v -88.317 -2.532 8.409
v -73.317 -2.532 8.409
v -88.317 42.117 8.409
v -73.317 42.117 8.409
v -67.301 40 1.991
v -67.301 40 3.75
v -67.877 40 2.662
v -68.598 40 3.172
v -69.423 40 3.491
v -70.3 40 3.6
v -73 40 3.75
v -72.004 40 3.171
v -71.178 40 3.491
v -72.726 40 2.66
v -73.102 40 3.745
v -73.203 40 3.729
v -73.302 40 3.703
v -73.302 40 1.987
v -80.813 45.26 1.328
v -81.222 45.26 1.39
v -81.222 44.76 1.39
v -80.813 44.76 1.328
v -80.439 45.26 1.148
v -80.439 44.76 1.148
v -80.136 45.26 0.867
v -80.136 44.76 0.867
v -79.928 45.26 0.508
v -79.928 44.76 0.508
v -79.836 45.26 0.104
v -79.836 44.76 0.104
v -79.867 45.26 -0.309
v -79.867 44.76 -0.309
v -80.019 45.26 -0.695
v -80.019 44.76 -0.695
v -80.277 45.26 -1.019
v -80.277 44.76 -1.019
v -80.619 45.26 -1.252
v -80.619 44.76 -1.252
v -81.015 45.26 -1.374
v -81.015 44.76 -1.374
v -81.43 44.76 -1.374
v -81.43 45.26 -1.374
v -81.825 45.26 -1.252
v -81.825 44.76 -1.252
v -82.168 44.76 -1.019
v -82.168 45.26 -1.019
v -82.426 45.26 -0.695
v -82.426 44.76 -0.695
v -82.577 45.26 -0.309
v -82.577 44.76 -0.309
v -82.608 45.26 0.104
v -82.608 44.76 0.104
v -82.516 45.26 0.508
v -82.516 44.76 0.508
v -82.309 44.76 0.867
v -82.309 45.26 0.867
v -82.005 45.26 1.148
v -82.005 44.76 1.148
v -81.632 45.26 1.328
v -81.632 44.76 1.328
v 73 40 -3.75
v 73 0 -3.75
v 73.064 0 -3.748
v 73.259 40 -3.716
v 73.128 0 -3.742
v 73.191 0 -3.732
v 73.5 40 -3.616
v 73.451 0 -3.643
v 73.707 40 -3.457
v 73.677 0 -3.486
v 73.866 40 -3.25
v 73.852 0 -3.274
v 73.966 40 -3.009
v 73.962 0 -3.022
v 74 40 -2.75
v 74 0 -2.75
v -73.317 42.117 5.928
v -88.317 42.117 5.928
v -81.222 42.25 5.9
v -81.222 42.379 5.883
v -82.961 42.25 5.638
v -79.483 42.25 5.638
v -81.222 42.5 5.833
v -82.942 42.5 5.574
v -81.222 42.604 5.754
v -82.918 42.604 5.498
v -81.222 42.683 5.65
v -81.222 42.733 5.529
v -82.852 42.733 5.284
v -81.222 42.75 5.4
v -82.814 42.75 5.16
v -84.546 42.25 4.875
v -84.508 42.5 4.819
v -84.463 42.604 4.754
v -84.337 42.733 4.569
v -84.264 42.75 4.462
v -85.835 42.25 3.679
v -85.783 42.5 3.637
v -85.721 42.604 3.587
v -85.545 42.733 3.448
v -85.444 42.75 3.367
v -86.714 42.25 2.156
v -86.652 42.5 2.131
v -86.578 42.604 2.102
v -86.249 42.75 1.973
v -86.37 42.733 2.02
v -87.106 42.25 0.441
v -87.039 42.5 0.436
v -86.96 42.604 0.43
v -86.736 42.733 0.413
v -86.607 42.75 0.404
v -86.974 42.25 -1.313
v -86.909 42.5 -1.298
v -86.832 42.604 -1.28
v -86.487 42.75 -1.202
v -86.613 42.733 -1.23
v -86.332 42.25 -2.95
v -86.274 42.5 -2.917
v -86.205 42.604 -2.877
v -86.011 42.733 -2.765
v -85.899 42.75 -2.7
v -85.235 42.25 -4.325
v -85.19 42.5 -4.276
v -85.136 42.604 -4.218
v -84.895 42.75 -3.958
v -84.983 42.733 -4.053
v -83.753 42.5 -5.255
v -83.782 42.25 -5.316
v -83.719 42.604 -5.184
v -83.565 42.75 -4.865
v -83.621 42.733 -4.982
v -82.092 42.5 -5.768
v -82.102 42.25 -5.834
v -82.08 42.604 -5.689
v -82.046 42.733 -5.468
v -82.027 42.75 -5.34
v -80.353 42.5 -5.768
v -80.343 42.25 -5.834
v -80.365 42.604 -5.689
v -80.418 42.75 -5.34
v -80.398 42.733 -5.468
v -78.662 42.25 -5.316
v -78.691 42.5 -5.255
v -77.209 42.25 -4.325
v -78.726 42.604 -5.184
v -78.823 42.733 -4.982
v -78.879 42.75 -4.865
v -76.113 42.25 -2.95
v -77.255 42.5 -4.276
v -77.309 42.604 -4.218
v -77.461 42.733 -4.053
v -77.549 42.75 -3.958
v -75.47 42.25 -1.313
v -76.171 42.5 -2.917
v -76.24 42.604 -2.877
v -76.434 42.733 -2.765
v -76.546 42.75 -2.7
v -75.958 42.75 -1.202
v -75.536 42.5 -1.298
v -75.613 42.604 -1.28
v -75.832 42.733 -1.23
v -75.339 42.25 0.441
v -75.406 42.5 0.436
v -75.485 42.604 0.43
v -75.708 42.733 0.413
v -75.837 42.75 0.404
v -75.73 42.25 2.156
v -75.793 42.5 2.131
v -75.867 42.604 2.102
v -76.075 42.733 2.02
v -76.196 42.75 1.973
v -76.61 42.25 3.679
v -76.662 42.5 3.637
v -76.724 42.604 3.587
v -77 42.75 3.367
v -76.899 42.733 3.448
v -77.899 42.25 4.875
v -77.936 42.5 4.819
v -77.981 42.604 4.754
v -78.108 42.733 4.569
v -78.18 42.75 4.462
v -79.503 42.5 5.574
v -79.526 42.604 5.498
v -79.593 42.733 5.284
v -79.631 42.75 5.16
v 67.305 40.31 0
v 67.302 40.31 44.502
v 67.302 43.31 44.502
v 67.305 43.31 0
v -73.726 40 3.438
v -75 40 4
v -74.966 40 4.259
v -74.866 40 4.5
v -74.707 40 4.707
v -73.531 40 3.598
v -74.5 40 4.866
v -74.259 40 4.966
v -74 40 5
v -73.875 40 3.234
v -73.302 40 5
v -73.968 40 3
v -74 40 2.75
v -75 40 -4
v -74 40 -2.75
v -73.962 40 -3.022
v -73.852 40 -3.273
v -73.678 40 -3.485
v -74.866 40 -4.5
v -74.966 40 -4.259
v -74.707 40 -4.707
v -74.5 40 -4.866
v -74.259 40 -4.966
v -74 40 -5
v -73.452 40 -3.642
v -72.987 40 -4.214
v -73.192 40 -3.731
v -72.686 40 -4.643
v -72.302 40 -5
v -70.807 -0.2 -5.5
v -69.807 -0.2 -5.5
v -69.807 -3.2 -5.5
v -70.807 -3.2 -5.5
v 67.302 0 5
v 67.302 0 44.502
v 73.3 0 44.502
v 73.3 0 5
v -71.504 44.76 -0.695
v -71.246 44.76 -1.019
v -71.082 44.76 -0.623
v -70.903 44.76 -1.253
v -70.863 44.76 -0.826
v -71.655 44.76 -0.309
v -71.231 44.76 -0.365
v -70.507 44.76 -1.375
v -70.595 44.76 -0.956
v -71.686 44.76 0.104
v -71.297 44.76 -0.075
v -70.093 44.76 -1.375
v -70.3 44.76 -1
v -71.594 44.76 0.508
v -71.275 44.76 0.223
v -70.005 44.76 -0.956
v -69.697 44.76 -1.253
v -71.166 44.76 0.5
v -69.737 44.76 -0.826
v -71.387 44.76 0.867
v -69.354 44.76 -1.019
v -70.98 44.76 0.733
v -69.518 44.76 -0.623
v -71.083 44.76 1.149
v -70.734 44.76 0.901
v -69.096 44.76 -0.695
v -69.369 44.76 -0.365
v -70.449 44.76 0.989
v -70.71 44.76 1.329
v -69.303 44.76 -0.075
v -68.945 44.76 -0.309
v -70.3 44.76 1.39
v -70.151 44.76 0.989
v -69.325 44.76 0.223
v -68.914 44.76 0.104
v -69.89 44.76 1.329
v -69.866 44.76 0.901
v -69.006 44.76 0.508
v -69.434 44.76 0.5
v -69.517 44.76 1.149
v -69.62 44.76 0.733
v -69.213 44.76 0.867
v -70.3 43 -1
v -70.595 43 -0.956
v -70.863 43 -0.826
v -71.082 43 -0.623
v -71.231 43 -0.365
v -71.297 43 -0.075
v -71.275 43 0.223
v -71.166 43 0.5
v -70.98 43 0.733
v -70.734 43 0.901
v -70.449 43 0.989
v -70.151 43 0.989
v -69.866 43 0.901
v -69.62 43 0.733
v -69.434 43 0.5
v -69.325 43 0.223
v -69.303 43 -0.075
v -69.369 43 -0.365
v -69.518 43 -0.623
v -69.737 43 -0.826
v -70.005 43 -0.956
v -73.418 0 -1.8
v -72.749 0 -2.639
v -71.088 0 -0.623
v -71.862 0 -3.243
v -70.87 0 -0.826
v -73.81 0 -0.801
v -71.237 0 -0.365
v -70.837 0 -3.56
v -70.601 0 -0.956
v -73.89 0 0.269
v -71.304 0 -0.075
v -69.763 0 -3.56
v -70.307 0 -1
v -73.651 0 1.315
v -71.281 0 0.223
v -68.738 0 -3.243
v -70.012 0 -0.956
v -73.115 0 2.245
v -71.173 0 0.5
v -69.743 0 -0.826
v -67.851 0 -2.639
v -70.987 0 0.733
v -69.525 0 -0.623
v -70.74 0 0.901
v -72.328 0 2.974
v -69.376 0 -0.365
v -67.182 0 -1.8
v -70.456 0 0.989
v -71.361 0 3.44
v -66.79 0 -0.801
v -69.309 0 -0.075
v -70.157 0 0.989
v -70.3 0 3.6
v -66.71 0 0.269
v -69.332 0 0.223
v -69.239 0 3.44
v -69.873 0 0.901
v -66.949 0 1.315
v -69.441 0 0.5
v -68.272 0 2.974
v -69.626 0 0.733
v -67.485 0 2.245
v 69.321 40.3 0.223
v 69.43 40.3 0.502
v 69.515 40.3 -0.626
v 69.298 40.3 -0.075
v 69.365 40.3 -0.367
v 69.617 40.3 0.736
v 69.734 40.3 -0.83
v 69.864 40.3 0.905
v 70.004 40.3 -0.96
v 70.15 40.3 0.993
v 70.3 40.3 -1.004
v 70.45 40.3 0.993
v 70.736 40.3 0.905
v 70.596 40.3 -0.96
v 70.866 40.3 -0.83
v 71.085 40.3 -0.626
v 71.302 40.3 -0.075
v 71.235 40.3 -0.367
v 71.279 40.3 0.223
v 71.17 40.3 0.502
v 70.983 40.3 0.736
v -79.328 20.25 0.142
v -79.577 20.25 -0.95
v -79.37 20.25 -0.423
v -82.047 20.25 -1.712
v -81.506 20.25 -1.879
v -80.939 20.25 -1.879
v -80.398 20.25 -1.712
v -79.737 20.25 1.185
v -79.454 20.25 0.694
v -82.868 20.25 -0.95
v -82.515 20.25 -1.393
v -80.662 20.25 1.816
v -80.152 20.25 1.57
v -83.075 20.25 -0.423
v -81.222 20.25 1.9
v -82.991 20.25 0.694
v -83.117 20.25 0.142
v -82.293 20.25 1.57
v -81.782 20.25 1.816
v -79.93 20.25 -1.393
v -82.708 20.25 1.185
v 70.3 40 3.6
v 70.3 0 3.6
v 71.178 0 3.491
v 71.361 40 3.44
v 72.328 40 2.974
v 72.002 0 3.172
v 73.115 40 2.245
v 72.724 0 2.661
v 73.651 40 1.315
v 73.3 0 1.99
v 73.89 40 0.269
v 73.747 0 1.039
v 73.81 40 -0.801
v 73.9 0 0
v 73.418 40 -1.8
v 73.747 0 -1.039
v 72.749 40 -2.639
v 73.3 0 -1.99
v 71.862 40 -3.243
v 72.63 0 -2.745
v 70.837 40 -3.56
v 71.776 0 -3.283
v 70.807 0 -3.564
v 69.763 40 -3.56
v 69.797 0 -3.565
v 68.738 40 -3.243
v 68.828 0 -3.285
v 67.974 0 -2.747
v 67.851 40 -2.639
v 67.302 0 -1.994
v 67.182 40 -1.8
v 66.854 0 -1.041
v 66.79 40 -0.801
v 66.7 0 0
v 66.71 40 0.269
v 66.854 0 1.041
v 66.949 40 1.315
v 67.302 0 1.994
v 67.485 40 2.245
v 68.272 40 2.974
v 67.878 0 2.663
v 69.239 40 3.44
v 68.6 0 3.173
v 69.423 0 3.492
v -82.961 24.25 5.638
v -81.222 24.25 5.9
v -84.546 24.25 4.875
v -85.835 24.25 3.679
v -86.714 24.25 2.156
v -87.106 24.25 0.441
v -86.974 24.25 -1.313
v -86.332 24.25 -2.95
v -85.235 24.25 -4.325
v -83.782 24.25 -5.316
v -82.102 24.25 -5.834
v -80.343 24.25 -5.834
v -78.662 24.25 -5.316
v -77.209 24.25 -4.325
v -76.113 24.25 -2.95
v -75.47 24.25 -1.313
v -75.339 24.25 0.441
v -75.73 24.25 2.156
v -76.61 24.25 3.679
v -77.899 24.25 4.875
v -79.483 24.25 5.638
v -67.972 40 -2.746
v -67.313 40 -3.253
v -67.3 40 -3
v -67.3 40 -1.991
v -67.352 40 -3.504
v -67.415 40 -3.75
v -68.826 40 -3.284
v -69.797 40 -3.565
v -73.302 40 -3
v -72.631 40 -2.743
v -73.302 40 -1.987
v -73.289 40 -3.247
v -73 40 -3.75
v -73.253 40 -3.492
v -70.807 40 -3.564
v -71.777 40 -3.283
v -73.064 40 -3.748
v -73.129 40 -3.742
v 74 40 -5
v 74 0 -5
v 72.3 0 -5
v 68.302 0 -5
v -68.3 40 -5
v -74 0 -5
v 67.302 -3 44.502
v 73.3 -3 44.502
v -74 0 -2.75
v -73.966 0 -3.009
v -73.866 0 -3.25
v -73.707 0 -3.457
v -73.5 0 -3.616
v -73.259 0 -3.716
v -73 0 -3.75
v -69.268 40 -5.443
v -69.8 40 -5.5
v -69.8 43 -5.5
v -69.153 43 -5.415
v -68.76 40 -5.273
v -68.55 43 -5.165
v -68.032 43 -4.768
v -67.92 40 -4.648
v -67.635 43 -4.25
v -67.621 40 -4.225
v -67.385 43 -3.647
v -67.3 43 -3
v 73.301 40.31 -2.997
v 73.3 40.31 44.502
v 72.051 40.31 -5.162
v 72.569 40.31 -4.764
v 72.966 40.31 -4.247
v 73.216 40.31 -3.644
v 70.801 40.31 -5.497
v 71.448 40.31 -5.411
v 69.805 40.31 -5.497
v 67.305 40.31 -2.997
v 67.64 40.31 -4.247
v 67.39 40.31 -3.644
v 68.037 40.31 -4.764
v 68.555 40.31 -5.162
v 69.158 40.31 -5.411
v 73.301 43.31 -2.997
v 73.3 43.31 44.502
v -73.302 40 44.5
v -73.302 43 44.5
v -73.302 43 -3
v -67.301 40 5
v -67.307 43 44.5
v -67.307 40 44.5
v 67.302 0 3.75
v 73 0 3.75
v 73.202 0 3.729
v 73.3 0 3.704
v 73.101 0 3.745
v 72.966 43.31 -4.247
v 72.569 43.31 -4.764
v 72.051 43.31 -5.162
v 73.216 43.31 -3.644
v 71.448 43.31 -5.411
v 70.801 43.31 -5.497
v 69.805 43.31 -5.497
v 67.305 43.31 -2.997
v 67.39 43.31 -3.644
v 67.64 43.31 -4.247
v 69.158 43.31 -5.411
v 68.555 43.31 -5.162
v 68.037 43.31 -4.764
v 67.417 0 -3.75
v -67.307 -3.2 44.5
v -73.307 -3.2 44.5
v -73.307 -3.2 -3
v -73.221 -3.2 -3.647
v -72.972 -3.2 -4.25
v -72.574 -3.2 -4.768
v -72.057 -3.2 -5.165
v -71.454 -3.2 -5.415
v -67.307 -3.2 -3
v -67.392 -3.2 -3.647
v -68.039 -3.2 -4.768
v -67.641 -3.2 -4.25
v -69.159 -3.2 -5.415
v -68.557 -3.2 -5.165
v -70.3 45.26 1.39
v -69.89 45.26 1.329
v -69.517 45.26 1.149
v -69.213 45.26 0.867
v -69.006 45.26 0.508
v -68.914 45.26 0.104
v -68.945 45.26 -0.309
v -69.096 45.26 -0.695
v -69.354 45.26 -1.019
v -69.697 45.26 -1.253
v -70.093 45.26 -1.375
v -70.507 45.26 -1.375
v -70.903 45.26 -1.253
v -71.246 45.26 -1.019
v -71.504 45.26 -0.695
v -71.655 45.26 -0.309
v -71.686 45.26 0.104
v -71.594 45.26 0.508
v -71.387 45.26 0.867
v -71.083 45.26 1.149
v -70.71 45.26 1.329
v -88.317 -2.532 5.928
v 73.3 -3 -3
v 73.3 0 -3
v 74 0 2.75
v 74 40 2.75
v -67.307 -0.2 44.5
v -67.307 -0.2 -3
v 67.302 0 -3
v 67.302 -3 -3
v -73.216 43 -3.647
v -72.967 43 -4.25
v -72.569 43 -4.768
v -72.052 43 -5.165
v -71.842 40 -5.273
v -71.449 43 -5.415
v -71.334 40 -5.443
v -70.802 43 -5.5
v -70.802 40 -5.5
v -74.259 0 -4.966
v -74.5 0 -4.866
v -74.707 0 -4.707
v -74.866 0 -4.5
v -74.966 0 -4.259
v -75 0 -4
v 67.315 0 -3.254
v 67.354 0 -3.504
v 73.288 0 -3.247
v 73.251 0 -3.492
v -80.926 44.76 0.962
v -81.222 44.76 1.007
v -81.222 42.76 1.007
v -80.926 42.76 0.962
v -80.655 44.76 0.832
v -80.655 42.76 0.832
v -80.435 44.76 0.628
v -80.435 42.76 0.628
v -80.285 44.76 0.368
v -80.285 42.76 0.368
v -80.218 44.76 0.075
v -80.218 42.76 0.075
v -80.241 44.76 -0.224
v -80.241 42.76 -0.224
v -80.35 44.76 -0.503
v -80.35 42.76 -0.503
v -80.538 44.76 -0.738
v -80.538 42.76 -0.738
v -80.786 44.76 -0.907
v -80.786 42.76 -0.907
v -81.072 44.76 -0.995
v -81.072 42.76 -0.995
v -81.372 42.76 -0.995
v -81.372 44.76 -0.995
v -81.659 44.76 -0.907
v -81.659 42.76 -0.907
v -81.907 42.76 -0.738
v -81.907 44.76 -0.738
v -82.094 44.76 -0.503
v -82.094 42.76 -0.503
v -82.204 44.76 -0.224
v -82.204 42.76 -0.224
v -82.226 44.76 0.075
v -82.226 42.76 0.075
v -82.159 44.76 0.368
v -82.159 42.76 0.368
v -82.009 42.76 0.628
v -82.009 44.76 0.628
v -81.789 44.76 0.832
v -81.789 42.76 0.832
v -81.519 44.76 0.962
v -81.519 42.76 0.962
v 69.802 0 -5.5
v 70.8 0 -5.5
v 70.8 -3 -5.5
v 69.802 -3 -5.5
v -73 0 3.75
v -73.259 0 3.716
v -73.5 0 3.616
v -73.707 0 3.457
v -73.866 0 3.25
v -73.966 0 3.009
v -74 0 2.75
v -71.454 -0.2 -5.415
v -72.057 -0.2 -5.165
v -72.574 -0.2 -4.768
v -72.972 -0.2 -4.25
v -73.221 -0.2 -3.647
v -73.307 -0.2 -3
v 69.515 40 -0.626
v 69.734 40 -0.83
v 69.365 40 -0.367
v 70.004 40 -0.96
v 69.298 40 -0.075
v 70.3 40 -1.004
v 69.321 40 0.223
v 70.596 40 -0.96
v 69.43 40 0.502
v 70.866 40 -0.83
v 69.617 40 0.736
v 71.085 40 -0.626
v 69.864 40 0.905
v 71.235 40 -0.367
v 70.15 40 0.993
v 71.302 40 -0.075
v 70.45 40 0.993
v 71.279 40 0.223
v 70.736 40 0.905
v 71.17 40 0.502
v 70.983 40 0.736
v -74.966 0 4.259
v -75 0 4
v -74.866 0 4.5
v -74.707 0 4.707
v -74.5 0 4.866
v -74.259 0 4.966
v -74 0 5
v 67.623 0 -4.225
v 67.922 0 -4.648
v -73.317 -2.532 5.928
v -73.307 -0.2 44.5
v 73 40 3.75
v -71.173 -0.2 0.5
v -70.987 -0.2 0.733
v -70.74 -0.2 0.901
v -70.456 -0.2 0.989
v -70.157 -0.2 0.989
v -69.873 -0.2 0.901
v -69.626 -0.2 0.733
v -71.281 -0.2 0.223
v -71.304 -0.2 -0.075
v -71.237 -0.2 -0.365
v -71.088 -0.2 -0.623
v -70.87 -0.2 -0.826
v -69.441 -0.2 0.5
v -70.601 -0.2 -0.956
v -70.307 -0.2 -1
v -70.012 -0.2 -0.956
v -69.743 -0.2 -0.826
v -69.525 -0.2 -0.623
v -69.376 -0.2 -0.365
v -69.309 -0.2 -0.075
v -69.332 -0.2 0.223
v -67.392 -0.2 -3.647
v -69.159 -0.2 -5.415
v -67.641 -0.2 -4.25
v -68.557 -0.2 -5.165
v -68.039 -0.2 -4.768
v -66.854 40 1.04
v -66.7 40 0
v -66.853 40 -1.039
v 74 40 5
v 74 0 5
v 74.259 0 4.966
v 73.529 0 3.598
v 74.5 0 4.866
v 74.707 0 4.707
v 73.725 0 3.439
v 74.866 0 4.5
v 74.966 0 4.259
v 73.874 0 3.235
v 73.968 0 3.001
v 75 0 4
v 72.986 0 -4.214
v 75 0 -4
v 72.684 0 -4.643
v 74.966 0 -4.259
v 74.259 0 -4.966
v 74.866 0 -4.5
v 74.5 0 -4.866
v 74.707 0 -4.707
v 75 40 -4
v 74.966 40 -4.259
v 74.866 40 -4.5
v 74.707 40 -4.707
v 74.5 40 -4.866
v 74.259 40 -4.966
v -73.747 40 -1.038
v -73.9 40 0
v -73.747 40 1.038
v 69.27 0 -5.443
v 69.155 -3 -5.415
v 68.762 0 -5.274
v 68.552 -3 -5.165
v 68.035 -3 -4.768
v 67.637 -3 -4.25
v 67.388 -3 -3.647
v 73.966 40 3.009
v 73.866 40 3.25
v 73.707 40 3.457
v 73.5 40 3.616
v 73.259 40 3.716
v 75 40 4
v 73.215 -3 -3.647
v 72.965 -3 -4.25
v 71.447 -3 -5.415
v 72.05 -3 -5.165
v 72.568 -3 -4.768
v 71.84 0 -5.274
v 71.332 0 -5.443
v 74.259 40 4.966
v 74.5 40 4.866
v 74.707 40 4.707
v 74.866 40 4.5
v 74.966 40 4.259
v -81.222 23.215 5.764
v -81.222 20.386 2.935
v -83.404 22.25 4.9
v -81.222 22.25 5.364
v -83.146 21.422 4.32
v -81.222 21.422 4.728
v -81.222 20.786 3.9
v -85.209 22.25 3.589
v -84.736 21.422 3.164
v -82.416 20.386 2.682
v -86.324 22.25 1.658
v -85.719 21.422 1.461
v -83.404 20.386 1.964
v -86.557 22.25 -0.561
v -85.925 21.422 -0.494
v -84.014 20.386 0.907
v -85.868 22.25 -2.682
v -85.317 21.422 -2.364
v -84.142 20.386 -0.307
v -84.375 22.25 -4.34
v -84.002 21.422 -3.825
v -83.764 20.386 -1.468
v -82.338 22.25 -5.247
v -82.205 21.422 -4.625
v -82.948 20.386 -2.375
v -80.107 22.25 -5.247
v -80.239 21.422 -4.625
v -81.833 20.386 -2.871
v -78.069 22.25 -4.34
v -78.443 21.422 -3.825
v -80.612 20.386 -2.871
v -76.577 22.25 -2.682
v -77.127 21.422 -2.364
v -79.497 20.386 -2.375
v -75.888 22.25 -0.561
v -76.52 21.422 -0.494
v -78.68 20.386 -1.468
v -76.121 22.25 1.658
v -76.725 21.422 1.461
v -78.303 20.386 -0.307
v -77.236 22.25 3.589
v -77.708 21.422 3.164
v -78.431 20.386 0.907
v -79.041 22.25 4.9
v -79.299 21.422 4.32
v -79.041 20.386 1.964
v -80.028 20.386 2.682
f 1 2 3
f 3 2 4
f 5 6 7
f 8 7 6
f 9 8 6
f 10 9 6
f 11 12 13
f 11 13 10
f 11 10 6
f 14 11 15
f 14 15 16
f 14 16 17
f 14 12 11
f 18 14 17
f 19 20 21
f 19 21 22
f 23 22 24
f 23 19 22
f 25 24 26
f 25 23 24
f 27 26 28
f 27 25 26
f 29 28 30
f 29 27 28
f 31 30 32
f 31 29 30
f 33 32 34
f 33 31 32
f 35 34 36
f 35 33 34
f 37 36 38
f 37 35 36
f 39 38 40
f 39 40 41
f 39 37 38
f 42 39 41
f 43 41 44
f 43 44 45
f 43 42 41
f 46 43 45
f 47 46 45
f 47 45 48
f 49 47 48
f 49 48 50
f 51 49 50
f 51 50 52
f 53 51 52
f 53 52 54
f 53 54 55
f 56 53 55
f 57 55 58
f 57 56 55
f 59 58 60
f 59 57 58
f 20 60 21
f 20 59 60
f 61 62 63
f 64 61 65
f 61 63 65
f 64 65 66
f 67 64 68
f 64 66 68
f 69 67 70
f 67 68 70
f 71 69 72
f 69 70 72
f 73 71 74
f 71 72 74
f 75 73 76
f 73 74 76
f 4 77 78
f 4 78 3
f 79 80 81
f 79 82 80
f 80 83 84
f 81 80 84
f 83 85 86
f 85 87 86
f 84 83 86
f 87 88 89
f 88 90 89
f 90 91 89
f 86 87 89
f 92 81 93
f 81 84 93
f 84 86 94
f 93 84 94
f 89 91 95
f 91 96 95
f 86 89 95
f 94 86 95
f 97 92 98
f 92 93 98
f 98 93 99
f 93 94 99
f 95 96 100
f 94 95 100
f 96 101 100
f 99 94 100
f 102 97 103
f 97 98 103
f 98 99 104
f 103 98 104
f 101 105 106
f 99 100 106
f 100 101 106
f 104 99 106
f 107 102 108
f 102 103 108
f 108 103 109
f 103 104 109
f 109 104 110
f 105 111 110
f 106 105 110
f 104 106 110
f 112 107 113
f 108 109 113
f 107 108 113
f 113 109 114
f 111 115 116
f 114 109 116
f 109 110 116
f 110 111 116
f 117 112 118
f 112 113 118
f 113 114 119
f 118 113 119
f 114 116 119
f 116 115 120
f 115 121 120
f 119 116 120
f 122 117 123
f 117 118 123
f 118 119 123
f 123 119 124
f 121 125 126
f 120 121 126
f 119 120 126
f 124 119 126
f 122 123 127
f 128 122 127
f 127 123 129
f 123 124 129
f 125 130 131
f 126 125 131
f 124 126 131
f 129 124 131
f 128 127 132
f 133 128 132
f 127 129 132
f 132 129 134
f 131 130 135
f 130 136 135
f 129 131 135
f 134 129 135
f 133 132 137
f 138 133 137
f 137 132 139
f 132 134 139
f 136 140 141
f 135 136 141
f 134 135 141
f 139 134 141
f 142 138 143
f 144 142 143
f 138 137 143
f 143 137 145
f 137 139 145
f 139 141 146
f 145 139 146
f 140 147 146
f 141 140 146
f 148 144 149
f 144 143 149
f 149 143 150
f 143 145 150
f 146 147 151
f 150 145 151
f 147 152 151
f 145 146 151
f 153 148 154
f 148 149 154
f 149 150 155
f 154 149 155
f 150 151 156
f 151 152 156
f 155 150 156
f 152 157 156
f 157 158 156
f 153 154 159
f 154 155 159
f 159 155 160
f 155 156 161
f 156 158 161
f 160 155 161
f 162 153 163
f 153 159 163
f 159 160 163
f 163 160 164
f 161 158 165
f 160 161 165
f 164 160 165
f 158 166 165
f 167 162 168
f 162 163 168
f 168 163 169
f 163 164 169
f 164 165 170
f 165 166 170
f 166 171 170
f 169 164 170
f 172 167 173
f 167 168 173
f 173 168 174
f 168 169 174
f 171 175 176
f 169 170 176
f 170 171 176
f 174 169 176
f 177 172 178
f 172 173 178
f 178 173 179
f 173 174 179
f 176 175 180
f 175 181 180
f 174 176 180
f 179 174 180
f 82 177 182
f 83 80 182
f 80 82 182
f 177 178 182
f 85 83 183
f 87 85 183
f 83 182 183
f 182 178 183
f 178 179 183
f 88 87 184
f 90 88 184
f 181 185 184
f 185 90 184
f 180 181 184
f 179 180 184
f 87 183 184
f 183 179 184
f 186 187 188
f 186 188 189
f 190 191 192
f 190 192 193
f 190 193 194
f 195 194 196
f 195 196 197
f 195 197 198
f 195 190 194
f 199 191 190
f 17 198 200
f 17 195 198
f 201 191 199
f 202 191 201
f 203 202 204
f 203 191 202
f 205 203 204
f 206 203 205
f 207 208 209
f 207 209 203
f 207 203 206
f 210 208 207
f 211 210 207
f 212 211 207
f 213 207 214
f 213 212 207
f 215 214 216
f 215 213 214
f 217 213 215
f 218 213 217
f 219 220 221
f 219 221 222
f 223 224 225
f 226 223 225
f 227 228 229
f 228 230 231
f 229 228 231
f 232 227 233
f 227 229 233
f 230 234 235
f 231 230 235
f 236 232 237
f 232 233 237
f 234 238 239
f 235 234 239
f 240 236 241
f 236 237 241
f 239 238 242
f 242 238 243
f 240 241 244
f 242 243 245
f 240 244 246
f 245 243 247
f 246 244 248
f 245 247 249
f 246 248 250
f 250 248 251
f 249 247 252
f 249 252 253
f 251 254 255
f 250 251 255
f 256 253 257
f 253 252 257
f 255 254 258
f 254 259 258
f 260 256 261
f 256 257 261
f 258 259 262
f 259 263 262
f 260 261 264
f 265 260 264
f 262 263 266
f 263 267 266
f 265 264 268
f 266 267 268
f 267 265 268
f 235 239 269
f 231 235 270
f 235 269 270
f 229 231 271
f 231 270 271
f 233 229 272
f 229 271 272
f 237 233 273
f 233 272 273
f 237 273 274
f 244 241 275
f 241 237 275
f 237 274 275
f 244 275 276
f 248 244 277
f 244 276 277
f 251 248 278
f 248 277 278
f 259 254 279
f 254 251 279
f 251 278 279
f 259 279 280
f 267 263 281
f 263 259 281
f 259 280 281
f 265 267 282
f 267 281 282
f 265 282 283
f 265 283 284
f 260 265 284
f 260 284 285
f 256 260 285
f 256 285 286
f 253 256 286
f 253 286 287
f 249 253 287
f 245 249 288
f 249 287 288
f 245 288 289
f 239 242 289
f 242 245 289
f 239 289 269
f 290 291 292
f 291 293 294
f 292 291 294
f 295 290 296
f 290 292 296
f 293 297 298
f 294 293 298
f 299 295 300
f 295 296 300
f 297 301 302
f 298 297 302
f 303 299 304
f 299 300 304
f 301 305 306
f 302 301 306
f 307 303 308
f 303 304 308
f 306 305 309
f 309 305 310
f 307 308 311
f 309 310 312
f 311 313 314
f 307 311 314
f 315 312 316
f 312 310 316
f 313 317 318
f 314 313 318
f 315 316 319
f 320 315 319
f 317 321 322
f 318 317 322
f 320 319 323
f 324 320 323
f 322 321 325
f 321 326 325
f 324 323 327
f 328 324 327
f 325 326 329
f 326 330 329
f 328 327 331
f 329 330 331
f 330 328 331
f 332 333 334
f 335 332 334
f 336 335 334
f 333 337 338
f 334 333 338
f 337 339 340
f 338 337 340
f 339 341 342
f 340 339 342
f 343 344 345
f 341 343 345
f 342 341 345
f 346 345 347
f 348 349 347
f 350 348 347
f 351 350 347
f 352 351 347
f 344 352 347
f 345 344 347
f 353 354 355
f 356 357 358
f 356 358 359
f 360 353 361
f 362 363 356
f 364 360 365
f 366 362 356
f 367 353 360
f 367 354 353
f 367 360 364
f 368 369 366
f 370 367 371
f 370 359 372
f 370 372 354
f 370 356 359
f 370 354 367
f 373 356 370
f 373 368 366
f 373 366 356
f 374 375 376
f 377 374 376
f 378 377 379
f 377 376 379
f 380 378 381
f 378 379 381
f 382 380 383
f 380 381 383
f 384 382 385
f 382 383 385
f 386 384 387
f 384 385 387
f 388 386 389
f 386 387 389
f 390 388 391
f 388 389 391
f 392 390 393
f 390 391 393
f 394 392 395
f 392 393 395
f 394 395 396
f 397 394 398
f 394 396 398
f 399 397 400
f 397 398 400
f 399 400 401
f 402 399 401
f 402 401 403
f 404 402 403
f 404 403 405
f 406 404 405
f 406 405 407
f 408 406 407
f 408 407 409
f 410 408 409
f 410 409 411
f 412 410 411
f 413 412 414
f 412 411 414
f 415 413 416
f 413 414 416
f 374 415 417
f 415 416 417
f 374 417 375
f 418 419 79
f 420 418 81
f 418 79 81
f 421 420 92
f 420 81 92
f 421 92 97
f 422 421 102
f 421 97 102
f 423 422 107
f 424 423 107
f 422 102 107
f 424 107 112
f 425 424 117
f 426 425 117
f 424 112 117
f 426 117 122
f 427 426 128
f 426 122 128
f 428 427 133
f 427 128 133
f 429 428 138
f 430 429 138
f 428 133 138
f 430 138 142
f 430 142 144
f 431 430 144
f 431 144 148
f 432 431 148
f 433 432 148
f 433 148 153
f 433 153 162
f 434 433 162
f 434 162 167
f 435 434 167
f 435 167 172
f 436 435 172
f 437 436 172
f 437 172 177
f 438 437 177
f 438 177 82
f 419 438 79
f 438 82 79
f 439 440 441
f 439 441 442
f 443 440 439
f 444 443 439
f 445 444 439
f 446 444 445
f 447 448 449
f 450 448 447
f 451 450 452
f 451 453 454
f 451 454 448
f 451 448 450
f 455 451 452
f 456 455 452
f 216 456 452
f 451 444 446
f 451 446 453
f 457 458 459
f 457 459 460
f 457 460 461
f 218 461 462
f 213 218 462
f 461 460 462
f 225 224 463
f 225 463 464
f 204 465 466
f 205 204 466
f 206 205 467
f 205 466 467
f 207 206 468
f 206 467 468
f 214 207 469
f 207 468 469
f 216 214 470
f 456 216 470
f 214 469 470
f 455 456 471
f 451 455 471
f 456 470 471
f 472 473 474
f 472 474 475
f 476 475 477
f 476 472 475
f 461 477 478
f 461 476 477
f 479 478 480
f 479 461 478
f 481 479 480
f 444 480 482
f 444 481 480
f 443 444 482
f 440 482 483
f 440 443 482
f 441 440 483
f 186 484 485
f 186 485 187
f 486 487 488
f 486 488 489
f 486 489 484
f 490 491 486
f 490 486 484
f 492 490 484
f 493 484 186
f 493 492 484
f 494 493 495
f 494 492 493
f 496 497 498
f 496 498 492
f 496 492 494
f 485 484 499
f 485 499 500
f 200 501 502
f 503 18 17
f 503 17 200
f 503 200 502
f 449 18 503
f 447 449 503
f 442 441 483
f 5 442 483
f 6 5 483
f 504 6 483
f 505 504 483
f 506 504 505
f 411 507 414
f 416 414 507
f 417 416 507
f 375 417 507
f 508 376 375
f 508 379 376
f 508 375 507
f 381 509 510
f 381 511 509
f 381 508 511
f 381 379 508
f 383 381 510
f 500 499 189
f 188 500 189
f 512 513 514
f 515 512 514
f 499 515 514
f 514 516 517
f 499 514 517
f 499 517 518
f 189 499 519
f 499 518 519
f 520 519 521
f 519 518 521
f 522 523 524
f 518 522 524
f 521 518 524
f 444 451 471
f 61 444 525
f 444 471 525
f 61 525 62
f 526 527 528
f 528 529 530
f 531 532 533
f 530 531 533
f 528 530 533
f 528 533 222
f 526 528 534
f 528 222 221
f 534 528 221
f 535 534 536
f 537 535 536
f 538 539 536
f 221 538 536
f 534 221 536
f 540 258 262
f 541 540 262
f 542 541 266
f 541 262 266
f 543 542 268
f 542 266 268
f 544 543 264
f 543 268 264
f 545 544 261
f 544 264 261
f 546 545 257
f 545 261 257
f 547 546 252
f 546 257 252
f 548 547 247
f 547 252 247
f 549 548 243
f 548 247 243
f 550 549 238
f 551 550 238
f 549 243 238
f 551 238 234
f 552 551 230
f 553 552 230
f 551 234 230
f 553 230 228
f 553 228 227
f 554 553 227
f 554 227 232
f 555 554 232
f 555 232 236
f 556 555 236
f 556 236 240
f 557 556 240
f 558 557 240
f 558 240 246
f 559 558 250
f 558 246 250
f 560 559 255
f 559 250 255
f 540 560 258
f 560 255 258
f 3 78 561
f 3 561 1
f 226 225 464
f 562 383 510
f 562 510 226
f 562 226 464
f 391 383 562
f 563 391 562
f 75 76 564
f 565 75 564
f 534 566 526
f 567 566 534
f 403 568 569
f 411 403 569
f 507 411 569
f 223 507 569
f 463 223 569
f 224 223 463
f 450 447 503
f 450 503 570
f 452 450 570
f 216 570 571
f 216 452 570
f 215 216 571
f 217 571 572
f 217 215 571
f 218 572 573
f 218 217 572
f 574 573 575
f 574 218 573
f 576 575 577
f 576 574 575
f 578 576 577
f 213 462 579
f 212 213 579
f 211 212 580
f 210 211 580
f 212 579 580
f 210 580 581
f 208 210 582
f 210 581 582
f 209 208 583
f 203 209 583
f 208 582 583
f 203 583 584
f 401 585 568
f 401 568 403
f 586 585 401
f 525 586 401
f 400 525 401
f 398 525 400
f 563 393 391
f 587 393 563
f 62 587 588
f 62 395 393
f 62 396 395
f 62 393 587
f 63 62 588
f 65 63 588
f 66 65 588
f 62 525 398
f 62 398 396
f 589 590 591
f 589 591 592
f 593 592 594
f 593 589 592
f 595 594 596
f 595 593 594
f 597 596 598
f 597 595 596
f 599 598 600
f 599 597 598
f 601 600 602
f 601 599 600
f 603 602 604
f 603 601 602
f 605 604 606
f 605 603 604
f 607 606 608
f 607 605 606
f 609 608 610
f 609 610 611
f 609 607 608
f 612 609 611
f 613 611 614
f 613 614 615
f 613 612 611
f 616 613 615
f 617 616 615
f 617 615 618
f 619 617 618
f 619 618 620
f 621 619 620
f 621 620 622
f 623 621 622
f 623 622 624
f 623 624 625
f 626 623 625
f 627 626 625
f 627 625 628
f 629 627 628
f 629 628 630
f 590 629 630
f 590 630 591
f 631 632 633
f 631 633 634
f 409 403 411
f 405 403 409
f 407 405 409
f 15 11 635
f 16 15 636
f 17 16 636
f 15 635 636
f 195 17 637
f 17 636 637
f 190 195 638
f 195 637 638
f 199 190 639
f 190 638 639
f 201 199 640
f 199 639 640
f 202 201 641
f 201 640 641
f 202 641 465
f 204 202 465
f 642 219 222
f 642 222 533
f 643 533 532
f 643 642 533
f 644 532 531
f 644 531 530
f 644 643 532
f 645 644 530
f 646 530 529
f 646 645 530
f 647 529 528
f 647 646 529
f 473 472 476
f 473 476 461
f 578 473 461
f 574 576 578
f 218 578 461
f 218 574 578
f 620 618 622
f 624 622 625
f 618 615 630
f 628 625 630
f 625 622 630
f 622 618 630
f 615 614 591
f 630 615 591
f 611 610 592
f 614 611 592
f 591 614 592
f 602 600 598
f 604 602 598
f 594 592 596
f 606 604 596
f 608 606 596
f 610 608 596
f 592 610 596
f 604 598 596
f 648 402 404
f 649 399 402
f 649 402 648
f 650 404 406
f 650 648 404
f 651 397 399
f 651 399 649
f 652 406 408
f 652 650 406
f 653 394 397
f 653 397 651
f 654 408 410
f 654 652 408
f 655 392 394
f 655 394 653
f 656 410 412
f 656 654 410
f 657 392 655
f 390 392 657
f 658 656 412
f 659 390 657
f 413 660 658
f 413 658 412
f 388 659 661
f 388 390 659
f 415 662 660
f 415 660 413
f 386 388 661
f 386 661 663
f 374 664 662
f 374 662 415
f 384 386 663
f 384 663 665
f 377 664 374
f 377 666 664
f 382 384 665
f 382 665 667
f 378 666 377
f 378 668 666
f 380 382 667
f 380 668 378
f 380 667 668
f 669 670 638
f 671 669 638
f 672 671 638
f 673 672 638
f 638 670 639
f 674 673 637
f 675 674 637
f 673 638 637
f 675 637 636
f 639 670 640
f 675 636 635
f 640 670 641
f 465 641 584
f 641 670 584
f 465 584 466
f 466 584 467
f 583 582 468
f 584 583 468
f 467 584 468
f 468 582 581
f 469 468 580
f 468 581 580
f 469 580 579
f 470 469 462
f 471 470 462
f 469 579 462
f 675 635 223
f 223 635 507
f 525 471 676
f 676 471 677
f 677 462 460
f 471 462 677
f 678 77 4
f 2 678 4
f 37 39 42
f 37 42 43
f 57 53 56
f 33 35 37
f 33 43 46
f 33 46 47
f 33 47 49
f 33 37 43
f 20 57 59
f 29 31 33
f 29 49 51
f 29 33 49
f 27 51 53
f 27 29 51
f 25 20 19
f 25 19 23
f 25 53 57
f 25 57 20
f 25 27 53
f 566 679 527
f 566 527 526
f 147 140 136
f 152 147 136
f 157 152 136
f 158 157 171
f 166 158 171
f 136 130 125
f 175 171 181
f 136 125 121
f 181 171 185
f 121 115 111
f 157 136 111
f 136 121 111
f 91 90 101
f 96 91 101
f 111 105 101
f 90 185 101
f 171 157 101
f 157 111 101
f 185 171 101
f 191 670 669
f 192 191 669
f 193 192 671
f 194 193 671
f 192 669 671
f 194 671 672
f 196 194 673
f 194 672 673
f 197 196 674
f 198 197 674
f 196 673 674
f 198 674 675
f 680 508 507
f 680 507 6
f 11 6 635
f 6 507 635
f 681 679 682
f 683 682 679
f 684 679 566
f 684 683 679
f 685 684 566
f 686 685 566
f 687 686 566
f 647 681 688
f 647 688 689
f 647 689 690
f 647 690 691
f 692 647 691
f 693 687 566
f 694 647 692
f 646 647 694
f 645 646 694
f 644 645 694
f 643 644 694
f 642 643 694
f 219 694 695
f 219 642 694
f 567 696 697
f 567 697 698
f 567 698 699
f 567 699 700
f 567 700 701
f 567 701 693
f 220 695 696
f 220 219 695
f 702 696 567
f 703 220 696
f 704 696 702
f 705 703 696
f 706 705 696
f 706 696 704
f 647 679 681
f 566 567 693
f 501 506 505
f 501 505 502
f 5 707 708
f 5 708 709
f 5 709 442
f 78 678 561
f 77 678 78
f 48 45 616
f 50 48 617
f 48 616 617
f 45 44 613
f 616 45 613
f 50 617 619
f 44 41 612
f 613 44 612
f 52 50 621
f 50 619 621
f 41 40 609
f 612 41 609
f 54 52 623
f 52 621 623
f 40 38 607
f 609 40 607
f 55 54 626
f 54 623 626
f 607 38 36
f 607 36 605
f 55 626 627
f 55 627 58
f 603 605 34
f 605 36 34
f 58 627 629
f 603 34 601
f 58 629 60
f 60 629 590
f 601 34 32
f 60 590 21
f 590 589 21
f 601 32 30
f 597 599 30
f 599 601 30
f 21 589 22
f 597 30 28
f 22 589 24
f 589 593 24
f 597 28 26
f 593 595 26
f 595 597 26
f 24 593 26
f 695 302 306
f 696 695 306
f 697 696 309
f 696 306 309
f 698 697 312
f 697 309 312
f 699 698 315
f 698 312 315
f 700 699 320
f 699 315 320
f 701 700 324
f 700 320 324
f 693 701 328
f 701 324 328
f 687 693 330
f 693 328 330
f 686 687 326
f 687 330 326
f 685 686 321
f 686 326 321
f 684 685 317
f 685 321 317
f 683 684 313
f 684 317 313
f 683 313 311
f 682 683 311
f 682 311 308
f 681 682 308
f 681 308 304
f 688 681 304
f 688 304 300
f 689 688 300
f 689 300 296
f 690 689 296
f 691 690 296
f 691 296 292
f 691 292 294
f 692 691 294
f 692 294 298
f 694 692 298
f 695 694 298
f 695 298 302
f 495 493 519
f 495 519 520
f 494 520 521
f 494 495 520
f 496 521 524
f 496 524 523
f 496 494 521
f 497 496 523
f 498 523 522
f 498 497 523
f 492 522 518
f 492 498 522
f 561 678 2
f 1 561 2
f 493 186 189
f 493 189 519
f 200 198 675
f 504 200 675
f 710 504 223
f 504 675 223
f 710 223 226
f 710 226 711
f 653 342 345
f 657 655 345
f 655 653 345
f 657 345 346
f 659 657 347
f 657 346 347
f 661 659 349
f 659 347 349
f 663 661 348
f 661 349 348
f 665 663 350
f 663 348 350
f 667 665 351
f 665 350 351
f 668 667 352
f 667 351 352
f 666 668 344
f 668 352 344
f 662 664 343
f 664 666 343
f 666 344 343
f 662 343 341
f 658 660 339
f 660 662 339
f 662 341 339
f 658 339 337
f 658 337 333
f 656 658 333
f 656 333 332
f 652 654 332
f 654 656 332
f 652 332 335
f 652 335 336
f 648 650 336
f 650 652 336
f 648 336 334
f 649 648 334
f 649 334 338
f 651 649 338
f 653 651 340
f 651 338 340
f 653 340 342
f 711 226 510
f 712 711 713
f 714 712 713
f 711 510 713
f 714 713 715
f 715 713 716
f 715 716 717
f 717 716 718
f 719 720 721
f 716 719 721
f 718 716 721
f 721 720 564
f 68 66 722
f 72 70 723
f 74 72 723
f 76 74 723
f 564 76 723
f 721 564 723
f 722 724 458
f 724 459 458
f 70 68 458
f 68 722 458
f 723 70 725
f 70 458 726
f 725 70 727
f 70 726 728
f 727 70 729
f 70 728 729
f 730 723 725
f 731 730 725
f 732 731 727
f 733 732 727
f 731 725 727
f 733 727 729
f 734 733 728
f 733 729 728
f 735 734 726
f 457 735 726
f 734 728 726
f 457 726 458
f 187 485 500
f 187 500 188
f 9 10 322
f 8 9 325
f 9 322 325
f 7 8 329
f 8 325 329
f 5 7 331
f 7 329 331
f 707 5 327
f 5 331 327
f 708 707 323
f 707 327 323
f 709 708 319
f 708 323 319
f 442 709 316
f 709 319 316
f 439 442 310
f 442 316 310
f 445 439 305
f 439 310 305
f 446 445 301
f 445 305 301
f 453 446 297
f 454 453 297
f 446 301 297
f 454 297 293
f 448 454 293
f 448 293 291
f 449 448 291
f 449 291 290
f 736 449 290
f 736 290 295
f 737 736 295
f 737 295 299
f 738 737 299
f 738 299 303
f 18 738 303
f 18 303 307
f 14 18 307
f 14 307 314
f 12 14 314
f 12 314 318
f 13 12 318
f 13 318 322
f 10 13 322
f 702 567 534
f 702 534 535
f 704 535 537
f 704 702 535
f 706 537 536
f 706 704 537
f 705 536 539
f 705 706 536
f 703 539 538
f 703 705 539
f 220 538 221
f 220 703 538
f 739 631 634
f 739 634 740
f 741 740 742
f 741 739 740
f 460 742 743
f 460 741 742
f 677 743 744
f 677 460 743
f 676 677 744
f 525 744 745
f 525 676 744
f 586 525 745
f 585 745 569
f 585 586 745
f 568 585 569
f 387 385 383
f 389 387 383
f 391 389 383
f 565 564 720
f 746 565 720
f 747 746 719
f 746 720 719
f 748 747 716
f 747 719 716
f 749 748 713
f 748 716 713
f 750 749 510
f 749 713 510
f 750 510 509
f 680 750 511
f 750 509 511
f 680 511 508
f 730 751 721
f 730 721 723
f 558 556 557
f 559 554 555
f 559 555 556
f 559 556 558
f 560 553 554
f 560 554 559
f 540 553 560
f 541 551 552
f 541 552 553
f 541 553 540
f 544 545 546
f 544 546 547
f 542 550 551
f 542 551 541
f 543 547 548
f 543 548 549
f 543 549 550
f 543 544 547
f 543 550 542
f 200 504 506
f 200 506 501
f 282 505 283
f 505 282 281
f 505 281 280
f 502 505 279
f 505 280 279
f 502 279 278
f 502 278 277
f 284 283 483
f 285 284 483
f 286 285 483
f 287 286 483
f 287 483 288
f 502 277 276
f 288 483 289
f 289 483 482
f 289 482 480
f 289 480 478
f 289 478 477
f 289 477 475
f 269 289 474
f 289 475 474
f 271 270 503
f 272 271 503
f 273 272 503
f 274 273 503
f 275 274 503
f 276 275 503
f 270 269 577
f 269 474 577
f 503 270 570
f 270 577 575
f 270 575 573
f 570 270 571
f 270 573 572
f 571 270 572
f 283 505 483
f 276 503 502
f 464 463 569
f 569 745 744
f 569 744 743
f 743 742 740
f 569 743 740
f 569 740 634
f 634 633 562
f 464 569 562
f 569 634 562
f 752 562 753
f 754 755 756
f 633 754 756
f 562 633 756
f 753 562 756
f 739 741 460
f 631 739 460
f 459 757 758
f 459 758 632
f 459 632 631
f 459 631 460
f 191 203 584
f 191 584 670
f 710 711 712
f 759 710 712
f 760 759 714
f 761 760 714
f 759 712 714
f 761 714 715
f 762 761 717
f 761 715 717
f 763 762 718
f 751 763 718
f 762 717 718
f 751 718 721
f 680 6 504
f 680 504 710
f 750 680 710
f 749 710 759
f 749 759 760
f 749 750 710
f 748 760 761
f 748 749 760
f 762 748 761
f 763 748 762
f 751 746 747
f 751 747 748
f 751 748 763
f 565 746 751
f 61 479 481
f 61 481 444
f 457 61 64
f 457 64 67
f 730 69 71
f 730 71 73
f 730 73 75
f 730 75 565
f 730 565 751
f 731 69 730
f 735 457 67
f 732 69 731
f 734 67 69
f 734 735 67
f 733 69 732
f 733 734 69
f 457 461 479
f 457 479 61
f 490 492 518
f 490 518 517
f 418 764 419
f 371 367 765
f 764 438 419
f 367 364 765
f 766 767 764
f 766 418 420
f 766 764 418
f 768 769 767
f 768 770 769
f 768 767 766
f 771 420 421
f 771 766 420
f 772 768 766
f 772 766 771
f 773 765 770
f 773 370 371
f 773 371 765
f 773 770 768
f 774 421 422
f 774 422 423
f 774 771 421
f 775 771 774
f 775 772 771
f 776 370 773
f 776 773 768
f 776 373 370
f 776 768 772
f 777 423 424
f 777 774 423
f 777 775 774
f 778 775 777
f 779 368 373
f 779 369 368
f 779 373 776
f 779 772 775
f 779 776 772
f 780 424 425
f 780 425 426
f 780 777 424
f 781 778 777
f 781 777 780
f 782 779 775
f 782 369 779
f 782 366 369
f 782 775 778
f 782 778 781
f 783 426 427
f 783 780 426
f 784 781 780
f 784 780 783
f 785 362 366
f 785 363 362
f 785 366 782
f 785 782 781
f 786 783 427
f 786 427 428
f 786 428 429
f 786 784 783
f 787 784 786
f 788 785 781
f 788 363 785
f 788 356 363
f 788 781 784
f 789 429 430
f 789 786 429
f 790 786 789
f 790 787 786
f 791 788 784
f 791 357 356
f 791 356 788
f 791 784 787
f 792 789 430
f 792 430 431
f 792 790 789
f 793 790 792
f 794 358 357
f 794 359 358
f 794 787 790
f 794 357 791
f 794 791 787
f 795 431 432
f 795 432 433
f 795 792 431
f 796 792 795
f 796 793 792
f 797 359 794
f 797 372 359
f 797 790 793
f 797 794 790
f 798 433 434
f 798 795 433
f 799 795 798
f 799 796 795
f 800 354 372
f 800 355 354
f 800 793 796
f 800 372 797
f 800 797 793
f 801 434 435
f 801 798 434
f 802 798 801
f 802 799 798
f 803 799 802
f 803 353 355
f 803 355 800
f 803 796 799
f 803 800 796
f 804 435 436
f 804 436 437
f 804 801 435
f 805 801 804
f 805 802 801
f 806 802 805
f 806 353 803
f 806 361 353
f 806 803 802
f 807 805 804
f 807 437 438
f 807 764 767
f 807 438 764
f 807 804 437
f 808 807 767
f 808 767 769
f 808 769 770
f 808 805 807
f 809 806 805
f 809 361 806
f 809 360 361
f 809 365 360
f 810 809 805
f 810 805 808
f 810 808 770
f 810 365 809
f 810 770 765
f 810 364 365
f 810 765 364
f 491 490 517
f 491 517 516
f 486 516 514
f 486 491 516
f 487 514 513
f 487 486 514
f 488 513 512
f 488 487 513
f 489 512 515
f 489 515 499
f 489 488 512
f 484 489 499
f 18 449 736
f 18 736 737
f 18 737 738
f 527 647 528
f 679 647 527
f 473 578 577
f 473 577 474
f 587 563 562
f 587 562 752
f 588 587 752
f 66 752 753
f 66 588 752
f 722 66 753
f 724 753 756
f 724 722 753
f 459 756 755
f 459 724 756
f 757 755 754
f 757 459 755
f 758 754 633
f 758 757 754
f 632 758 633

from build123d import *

# Parameters (mm, degrees)
SALIENTE_EXTRUIR1_DEPTH       = 40
CORTAR_EXTRUIR5_DEPTH         = 40
CORTAR_EXTRUIR5_DEPTH_BACK    = 40
CROQUIS6_R                    = 3.6
SALIENTE_EXTRUIR2_DEPTH       = 40
SALIENTE_EXTRUIR3_DEPTH       = 0.2
SALIENTE_EXTRUIR3_DEPTH_BACK  = 40.3
CROQUIS7_R                    = 1.004336789
CROQUIS8_R                    = 3.6
SALIENTE_EXTRUIR4_DEPTH       = 40
SALIENTE_EXTRUIR5_DEPTH       = 0.2
SALIENTE_EXTRUIR5_DEPTH_BACK  = 40.3
CROQUIS9_R                    = 1
SALIENTE_EXTRUIR7_DEPTH       = 3
SALIENTE_EXTRUIR8_DEPTH       = 3
SALIENTE_EXTRUIR9_DEPTH       = 3
SALIENTE_EXTRUIR10_DEPTH      = 3
CROQUIS15_R                   = 1
SALIENTE_EXTRUIR11_DEPTH      = 2
SALIENTE_EXTRUIR12_DEPTH      = 0.25
SALIENTE_EXTRUIR12_DEPTH_BACK = 0.25
CROQUIS16_R                   = 1.390331977
CROQUIS17_W                   = 2.480806326
CROQUIS17_H                   = 44.649028396
SALIENTE_EXTRUIR13_DEPTH      = 15
CROQUIS18_R                   = 1.39
SALIENTE_EXTRUIR14_DEPTH      = 0.5
CROQUIS19_R                   = 1.006716992
SALIENTE_EXTRUIR15_DEPTH      = 2.5
CROQUIS20_R                   = 5.9
SALIENTE_EXTRUIR17_DEPTH      = 22.5
REDONDEO2_R                   = 4
REDONDEO4_R                   = 0.5


with BuildPart() as part:
    # Croquis1 → Saliente-Extruir1 (new body)
    with BuildSketch(Plane(origin=(0, 0, 0), x_dir=(1, 0, 0), z_dir=(0, 1, 0))):
        with BuildLine():
            Line((-74, -5), (74, -5))
            ThreePointArc((74, -5), (74.707106781, -4.707106781), (75, -4))
            Line((75, -4), (75, 4))
            ThreePointArc((75, 4), (74.707106781, 4.707106781), (74, 5))
            Line((74, 5), (-74, 5))
            ThreePointArc((-74, 5), (-74.707106781, 4.707106781), (-75, 4))
            Line((-75, 4), (-75, -4))
            ThreePointArc((-75, -4), (-74.707106781, -4.707106781), (-74, -5))
        make_face()
    extrude(amount=SALIENTE_EXTRUIR1_DEPTH)

    # Croquis5 → Cortar-Extruir5 (cut, two sides: drawn at the far end of the back side and taken through both)
    with BuildSketch(Plane(origin=(0, 0, 0), x_dir=(1, 0, 0), z_dir=(0, 1, 0)).offset(-CORTAR_EXTRUIR5_DEPTH_BACK)):
        with BuildLine():
            Line((73, -3.75), (-73, -3.75))
            ThreePointArc((-73, -3.75), (-73.707106781, -3.457106781), (-74, -2.75))
            Line((-74, -2.75), (-74, 2.75))
            ThreePointArc((-74, 2.75), (-73.707106781, 3.457106781), (-73, 3.75))
            Line((-73, 3.75), (73, 3.75))
            ThreePointArc((73, 3.75), (73.707106781, 3.457106781), (74, 2.75))
            Line((74, 2.75), (74, -2.75))
            ThreePointArc((74, -2.75), (73.707106781, -3.457106781), (73, -3.75))
        make_face()
    extrude(amount=CORTAR_EXTRUIR5_DEPTH + CORTAR_EXTRUIR5_DEPTH_BACK, mode=Mode.SUBTRACT)



with BuildPart() as body_2:
    # Croquis6 → Saliente-Extruir2 (new body)
    with BuildSketch(Plane(origin=(0, 0, 0), x_dir=(1, 0, 0), z_dir=(0, 1, 0))):
        with Locations((70.3, 0)):
            Circle(CROQUIS6_R)
    extrude(amount=SALIENTE_EXTRUIR2_DEPTH)

    # Croquis7 → Saliente-Extruir3 (add, two sides: drawn at the far end of the back side and taken through both)
    with BuildSketch(Plane(origin=(0, 0, 0), x_dir=(-1, 0, 0), z_dir=(0, -1, 0)).offset(-SALIENTE_EXTRUIR3_DEPTH_BACK)):
        with Locations((-70.3, 0)):
            Circle(CROQUIS7_R)
    extrude(amount=SALIENTE_EXTRUIR3_DEPTH + SALIENTE_EXTRUIR3_DEPTH_BACK)


with BuildPart() as body_3:
    # Croquis8 → Saliente-Extruir4 (new body)
    with BuildSketch(Plane(origin=(0, 0, 0), x_dir=(1, 0, 0), z_dir=(0, 1, 0))):
        with Locations((-70.3, 0)):
            Circle(CROQUIS8_R)
    extrude(amount=SALIENTE_EXTRUIR4_DEPTH)

    # Croquis9 → Saliente-Extruir5 (add, two sides: drawn at the far end of the back side and taken through both)
    with BuildSketch(Plane(origin=(0, 0, 0), x_dir=(-1, 0, 0), z_dir=(0, -1, 0)).offset(-SALIENTE_EXTRUIR5_DEPTH_BACK)):
        with Locations((70.306536117, 0)):
            Circle(CROQUIS9_R)
    extrude(amount=SALIENTE_EXTRUIR5_DEPTH + SALIENTE_EXTRUIR5_DEPTH_BACK)

    # Croquis11 → Saliente-Extruir7 (add)
    with BuildSketch(Plane(origin=(0, -0.2, 0), x_dir=(-1, 0, 0), z_dir=(0, -1, 0))):
        with BuildLine():
            Line((67.306536117, 0), (67.306536117, 3))
            ThreePointArc((67.306536117, 3), (68.038769164, 4.767766953), (69.806536117, 5.5))
            Line((69.806536117, 5.5), (70.806536117, 5.5))
            ThreePointArc((70.806536117, 5.5), (72.57430307, 4.767766953), (73.306536117, 3))
            Line((73.306536117, 3), (73.306536117, 0))
            Line((73.306536117, 0), (73.306536117, -44.5))
            Line((73.306536117, -44.5), (67.306536117, -44.5))
            Line((67.306536117, -44.5), (67.306536117, 0))
        make_face()
    extrude(amount=SALIENTE_EXTRUIR7_DEPTH)


with BuildPart() as part_1:
    add(part.part)

    add(body_2.part)  # Saliente-Extruir8 merges body 2
    # Croquis12 → Saliente-Extruir8 (add)
    with BuildSketch(Plane(origin=(0, 0, 0), x_dir=(-1, 0, 0), z_dir=(0, -1, 0))):
        with BuildLine():
            Line((-73.3, 0), (-73.3, 3.000270976))
            ThreePointArc((-73.3, 3.000270976), (-72.567766953, 4.768037929), (-70.8, 5.500270976))
            Line((-70.8, 5.500270976), (-69.802345903, 5.500270976))
            ThreePointArc((-69.802345903, 5.500270976), (-68.03457895, 4.768037929), (-67.302345903, 3.000270976))
            Line((-67.302345903, 3.000270976), (-67.302345903, 0))
            Line((-67.302345903, 0), (-67.302345903, -44.502121213))
            Line((-67.302345903, -44.502121213), (-73.3, -44.502121213))
            Line((-73.3, -44.502121213), (-73.3, 0))
        make_face()
    extrude(amount=SALIENTE_EXTRUIR8_DEPTH)


    add(body_3.part)  # Saliente-Extruir10 merges body 3
    # Croquis14 → Saliente-Extruir10 (add)
    with BuildSketch(Plane(origin=(0, 40, 0), x_dir=(1, 0, 0), z_dir=(0, 1, 0))):
        with BuildLine():
            Line((-73.301674295, 0), (-73.301674295, 3))
            ThreePointArc((-73.301674295, 3), (-72.569441248, 4.767766953), (-70.801674295, 5.5))
            Line((-70.801674295, 5.5), (-69.800220238, 5.5))
            ThreePointArc((-69.800220238, 5.5), (-68.032335762, 4.767649422), (-67.30022026, 2.999667584))
            Line((-67.30022026, 2.999667584), (-67.306536117, -44.5))
            Line((-67.306536117, -44.5), (-73.301674295, -44.5))
            Line((-73.301674295, -44.5), (-73.301674295, 0))
        make_face()
    extrude(amount=SALIENTE_EXTRUIR10_DEPTH)

    # Croquis15 → Saliente-Extruir11 (add)
    with BuildSketch(Plane(origin=(0, 43, 0), x_dir=(1, 0, 0), z_dir=(0, 1, 0))):
        with Locations((-70.3, 0)):
            Circle(CROQUIS15_R)
    extrude(amount=SALIENTE_EXTRUIR11_DEPTH)

    # Croquis16 → Saliente-Extruir12 (add, two sides: drawn at the far end of the back side and taken through both)
    with BuildSketch(Plane(origin=(0, 45.01, 0), x_dir=(1, 0, 0), z_dir=(0, 1, 0)).offset(-SALIENTE_EXTRUIR12_DEPTH_BACK)):
        with Locations((-70.3, 0)):
            Circle(CROQUIS16_R)
    extrude(amount=SALIENTE_EXTRUIR12_DEPTH + SALIENTE_EXTRUIR12_DEPTH_BACK)


with BuildPart() as body_3_2:
    # Croquis13 → Saliente-Extruir9 (new body)
    with BuildSketch(Plane(origin=(0, 40.31, 0), x_dir=(1, 0, 0), z_dir=(0, 1, 0))):
        with BuildLine():
            Line((67.304998702, 0), (67.304998702, 2.996670167))
            ThreePointArc((67.304998702, 2.996670167), (68.037231749, 4.76443712), (69.804998702, 5.496670167))
            Line((69.804998702, 5.496670167), (70.800948612, 5.496670167))
            ThreePointArc((70.800948612, 5.496670167), (72.568733217, 4.764419468), (73.300948612, 2.996620239))
            Line((73.300948612, 2.996620239), (73.3, -44.502121213))
            Line((73.3, -44.502121213), (67.302345903, -44.502121213))
            Line((67.302345903, -44.502121213), (67.304998702, 0))
        make_face()
    extrude(amount=SALIENTE_EXTRUIR9_DEPTH)


with BuildPart() as body_3_3:
    # Croquis17 → Saliente-Extruir13 (new body)
    with BuildSketch(Plane.ZY.offset(73.316536117)):
        with Locations((7.168850189, 19.792884291)):
            Rectangle(CROQUIS17_W, CROQUIS17_H)
    extrude(amount=SALIENTE_EXTRUIR13_DEPTH)


with BuildPart() as body_4:
    # Croquis18 → Saliente-Extruir14 (new body)
    with BuildSketch(Plane(origin=(0, 45.26, 0), x_dir=(1, 0, 0), z_dir=(0, 1, 0))):
        with Locations((-81.222340587, 0)):
            Circle(CROQUIS18_R)
    extrude(amount=-SALIENTE_EXTRUIR14_DEPTH)

    # Croquis19 → Saliente-Extruir15 (add)
    with BuildSketch(Plane(origin=(0, 45.26, 0), x_dir=(1, 0, 0), z_dir=(0, 1, 0))):
        with Locations((-81.222340587, 0)):
            Circle(CROQUIS19_R)
    extrude(amount=-SALIENTE_EXTRUIR15_DEPTH)


with BuildPart() as body_5:
    # Croquis20 → Saliente-Extruir17 (new body)
    with BuildSketch(Plane(origin=(0, 42.75, 0), x_dir=(-1, 0, 0), z_dir=(0, -1, 0))):
        with Locations((81.222340587, 0)):
            Circle(CROQUIS20_R)
    extrude(amount=SALIENTE_EXTRUIR17_DEPTH)

    # Redondeo2
    redondeo2_edges = [body_5.edges().sort_by_distance(p)[0] for p in [
        (-75.322340587, 20.25, 0),
    ]]
    fillet(redondeo2_edges, radius=REDONDEO2_R)

    # Redondeo4
    redondeo4_edges = [body_5.edges().sort_by_distance(p)[0] for p in [
        (-75.322340587, 42.75, 0),
    ]]
    fillet(redondeo4_edges, radius=REDONDEO4_R)


solid = Compound([part_1.part, body_3_2.part, body_3_3.part, body_4.part, body_5.part])
